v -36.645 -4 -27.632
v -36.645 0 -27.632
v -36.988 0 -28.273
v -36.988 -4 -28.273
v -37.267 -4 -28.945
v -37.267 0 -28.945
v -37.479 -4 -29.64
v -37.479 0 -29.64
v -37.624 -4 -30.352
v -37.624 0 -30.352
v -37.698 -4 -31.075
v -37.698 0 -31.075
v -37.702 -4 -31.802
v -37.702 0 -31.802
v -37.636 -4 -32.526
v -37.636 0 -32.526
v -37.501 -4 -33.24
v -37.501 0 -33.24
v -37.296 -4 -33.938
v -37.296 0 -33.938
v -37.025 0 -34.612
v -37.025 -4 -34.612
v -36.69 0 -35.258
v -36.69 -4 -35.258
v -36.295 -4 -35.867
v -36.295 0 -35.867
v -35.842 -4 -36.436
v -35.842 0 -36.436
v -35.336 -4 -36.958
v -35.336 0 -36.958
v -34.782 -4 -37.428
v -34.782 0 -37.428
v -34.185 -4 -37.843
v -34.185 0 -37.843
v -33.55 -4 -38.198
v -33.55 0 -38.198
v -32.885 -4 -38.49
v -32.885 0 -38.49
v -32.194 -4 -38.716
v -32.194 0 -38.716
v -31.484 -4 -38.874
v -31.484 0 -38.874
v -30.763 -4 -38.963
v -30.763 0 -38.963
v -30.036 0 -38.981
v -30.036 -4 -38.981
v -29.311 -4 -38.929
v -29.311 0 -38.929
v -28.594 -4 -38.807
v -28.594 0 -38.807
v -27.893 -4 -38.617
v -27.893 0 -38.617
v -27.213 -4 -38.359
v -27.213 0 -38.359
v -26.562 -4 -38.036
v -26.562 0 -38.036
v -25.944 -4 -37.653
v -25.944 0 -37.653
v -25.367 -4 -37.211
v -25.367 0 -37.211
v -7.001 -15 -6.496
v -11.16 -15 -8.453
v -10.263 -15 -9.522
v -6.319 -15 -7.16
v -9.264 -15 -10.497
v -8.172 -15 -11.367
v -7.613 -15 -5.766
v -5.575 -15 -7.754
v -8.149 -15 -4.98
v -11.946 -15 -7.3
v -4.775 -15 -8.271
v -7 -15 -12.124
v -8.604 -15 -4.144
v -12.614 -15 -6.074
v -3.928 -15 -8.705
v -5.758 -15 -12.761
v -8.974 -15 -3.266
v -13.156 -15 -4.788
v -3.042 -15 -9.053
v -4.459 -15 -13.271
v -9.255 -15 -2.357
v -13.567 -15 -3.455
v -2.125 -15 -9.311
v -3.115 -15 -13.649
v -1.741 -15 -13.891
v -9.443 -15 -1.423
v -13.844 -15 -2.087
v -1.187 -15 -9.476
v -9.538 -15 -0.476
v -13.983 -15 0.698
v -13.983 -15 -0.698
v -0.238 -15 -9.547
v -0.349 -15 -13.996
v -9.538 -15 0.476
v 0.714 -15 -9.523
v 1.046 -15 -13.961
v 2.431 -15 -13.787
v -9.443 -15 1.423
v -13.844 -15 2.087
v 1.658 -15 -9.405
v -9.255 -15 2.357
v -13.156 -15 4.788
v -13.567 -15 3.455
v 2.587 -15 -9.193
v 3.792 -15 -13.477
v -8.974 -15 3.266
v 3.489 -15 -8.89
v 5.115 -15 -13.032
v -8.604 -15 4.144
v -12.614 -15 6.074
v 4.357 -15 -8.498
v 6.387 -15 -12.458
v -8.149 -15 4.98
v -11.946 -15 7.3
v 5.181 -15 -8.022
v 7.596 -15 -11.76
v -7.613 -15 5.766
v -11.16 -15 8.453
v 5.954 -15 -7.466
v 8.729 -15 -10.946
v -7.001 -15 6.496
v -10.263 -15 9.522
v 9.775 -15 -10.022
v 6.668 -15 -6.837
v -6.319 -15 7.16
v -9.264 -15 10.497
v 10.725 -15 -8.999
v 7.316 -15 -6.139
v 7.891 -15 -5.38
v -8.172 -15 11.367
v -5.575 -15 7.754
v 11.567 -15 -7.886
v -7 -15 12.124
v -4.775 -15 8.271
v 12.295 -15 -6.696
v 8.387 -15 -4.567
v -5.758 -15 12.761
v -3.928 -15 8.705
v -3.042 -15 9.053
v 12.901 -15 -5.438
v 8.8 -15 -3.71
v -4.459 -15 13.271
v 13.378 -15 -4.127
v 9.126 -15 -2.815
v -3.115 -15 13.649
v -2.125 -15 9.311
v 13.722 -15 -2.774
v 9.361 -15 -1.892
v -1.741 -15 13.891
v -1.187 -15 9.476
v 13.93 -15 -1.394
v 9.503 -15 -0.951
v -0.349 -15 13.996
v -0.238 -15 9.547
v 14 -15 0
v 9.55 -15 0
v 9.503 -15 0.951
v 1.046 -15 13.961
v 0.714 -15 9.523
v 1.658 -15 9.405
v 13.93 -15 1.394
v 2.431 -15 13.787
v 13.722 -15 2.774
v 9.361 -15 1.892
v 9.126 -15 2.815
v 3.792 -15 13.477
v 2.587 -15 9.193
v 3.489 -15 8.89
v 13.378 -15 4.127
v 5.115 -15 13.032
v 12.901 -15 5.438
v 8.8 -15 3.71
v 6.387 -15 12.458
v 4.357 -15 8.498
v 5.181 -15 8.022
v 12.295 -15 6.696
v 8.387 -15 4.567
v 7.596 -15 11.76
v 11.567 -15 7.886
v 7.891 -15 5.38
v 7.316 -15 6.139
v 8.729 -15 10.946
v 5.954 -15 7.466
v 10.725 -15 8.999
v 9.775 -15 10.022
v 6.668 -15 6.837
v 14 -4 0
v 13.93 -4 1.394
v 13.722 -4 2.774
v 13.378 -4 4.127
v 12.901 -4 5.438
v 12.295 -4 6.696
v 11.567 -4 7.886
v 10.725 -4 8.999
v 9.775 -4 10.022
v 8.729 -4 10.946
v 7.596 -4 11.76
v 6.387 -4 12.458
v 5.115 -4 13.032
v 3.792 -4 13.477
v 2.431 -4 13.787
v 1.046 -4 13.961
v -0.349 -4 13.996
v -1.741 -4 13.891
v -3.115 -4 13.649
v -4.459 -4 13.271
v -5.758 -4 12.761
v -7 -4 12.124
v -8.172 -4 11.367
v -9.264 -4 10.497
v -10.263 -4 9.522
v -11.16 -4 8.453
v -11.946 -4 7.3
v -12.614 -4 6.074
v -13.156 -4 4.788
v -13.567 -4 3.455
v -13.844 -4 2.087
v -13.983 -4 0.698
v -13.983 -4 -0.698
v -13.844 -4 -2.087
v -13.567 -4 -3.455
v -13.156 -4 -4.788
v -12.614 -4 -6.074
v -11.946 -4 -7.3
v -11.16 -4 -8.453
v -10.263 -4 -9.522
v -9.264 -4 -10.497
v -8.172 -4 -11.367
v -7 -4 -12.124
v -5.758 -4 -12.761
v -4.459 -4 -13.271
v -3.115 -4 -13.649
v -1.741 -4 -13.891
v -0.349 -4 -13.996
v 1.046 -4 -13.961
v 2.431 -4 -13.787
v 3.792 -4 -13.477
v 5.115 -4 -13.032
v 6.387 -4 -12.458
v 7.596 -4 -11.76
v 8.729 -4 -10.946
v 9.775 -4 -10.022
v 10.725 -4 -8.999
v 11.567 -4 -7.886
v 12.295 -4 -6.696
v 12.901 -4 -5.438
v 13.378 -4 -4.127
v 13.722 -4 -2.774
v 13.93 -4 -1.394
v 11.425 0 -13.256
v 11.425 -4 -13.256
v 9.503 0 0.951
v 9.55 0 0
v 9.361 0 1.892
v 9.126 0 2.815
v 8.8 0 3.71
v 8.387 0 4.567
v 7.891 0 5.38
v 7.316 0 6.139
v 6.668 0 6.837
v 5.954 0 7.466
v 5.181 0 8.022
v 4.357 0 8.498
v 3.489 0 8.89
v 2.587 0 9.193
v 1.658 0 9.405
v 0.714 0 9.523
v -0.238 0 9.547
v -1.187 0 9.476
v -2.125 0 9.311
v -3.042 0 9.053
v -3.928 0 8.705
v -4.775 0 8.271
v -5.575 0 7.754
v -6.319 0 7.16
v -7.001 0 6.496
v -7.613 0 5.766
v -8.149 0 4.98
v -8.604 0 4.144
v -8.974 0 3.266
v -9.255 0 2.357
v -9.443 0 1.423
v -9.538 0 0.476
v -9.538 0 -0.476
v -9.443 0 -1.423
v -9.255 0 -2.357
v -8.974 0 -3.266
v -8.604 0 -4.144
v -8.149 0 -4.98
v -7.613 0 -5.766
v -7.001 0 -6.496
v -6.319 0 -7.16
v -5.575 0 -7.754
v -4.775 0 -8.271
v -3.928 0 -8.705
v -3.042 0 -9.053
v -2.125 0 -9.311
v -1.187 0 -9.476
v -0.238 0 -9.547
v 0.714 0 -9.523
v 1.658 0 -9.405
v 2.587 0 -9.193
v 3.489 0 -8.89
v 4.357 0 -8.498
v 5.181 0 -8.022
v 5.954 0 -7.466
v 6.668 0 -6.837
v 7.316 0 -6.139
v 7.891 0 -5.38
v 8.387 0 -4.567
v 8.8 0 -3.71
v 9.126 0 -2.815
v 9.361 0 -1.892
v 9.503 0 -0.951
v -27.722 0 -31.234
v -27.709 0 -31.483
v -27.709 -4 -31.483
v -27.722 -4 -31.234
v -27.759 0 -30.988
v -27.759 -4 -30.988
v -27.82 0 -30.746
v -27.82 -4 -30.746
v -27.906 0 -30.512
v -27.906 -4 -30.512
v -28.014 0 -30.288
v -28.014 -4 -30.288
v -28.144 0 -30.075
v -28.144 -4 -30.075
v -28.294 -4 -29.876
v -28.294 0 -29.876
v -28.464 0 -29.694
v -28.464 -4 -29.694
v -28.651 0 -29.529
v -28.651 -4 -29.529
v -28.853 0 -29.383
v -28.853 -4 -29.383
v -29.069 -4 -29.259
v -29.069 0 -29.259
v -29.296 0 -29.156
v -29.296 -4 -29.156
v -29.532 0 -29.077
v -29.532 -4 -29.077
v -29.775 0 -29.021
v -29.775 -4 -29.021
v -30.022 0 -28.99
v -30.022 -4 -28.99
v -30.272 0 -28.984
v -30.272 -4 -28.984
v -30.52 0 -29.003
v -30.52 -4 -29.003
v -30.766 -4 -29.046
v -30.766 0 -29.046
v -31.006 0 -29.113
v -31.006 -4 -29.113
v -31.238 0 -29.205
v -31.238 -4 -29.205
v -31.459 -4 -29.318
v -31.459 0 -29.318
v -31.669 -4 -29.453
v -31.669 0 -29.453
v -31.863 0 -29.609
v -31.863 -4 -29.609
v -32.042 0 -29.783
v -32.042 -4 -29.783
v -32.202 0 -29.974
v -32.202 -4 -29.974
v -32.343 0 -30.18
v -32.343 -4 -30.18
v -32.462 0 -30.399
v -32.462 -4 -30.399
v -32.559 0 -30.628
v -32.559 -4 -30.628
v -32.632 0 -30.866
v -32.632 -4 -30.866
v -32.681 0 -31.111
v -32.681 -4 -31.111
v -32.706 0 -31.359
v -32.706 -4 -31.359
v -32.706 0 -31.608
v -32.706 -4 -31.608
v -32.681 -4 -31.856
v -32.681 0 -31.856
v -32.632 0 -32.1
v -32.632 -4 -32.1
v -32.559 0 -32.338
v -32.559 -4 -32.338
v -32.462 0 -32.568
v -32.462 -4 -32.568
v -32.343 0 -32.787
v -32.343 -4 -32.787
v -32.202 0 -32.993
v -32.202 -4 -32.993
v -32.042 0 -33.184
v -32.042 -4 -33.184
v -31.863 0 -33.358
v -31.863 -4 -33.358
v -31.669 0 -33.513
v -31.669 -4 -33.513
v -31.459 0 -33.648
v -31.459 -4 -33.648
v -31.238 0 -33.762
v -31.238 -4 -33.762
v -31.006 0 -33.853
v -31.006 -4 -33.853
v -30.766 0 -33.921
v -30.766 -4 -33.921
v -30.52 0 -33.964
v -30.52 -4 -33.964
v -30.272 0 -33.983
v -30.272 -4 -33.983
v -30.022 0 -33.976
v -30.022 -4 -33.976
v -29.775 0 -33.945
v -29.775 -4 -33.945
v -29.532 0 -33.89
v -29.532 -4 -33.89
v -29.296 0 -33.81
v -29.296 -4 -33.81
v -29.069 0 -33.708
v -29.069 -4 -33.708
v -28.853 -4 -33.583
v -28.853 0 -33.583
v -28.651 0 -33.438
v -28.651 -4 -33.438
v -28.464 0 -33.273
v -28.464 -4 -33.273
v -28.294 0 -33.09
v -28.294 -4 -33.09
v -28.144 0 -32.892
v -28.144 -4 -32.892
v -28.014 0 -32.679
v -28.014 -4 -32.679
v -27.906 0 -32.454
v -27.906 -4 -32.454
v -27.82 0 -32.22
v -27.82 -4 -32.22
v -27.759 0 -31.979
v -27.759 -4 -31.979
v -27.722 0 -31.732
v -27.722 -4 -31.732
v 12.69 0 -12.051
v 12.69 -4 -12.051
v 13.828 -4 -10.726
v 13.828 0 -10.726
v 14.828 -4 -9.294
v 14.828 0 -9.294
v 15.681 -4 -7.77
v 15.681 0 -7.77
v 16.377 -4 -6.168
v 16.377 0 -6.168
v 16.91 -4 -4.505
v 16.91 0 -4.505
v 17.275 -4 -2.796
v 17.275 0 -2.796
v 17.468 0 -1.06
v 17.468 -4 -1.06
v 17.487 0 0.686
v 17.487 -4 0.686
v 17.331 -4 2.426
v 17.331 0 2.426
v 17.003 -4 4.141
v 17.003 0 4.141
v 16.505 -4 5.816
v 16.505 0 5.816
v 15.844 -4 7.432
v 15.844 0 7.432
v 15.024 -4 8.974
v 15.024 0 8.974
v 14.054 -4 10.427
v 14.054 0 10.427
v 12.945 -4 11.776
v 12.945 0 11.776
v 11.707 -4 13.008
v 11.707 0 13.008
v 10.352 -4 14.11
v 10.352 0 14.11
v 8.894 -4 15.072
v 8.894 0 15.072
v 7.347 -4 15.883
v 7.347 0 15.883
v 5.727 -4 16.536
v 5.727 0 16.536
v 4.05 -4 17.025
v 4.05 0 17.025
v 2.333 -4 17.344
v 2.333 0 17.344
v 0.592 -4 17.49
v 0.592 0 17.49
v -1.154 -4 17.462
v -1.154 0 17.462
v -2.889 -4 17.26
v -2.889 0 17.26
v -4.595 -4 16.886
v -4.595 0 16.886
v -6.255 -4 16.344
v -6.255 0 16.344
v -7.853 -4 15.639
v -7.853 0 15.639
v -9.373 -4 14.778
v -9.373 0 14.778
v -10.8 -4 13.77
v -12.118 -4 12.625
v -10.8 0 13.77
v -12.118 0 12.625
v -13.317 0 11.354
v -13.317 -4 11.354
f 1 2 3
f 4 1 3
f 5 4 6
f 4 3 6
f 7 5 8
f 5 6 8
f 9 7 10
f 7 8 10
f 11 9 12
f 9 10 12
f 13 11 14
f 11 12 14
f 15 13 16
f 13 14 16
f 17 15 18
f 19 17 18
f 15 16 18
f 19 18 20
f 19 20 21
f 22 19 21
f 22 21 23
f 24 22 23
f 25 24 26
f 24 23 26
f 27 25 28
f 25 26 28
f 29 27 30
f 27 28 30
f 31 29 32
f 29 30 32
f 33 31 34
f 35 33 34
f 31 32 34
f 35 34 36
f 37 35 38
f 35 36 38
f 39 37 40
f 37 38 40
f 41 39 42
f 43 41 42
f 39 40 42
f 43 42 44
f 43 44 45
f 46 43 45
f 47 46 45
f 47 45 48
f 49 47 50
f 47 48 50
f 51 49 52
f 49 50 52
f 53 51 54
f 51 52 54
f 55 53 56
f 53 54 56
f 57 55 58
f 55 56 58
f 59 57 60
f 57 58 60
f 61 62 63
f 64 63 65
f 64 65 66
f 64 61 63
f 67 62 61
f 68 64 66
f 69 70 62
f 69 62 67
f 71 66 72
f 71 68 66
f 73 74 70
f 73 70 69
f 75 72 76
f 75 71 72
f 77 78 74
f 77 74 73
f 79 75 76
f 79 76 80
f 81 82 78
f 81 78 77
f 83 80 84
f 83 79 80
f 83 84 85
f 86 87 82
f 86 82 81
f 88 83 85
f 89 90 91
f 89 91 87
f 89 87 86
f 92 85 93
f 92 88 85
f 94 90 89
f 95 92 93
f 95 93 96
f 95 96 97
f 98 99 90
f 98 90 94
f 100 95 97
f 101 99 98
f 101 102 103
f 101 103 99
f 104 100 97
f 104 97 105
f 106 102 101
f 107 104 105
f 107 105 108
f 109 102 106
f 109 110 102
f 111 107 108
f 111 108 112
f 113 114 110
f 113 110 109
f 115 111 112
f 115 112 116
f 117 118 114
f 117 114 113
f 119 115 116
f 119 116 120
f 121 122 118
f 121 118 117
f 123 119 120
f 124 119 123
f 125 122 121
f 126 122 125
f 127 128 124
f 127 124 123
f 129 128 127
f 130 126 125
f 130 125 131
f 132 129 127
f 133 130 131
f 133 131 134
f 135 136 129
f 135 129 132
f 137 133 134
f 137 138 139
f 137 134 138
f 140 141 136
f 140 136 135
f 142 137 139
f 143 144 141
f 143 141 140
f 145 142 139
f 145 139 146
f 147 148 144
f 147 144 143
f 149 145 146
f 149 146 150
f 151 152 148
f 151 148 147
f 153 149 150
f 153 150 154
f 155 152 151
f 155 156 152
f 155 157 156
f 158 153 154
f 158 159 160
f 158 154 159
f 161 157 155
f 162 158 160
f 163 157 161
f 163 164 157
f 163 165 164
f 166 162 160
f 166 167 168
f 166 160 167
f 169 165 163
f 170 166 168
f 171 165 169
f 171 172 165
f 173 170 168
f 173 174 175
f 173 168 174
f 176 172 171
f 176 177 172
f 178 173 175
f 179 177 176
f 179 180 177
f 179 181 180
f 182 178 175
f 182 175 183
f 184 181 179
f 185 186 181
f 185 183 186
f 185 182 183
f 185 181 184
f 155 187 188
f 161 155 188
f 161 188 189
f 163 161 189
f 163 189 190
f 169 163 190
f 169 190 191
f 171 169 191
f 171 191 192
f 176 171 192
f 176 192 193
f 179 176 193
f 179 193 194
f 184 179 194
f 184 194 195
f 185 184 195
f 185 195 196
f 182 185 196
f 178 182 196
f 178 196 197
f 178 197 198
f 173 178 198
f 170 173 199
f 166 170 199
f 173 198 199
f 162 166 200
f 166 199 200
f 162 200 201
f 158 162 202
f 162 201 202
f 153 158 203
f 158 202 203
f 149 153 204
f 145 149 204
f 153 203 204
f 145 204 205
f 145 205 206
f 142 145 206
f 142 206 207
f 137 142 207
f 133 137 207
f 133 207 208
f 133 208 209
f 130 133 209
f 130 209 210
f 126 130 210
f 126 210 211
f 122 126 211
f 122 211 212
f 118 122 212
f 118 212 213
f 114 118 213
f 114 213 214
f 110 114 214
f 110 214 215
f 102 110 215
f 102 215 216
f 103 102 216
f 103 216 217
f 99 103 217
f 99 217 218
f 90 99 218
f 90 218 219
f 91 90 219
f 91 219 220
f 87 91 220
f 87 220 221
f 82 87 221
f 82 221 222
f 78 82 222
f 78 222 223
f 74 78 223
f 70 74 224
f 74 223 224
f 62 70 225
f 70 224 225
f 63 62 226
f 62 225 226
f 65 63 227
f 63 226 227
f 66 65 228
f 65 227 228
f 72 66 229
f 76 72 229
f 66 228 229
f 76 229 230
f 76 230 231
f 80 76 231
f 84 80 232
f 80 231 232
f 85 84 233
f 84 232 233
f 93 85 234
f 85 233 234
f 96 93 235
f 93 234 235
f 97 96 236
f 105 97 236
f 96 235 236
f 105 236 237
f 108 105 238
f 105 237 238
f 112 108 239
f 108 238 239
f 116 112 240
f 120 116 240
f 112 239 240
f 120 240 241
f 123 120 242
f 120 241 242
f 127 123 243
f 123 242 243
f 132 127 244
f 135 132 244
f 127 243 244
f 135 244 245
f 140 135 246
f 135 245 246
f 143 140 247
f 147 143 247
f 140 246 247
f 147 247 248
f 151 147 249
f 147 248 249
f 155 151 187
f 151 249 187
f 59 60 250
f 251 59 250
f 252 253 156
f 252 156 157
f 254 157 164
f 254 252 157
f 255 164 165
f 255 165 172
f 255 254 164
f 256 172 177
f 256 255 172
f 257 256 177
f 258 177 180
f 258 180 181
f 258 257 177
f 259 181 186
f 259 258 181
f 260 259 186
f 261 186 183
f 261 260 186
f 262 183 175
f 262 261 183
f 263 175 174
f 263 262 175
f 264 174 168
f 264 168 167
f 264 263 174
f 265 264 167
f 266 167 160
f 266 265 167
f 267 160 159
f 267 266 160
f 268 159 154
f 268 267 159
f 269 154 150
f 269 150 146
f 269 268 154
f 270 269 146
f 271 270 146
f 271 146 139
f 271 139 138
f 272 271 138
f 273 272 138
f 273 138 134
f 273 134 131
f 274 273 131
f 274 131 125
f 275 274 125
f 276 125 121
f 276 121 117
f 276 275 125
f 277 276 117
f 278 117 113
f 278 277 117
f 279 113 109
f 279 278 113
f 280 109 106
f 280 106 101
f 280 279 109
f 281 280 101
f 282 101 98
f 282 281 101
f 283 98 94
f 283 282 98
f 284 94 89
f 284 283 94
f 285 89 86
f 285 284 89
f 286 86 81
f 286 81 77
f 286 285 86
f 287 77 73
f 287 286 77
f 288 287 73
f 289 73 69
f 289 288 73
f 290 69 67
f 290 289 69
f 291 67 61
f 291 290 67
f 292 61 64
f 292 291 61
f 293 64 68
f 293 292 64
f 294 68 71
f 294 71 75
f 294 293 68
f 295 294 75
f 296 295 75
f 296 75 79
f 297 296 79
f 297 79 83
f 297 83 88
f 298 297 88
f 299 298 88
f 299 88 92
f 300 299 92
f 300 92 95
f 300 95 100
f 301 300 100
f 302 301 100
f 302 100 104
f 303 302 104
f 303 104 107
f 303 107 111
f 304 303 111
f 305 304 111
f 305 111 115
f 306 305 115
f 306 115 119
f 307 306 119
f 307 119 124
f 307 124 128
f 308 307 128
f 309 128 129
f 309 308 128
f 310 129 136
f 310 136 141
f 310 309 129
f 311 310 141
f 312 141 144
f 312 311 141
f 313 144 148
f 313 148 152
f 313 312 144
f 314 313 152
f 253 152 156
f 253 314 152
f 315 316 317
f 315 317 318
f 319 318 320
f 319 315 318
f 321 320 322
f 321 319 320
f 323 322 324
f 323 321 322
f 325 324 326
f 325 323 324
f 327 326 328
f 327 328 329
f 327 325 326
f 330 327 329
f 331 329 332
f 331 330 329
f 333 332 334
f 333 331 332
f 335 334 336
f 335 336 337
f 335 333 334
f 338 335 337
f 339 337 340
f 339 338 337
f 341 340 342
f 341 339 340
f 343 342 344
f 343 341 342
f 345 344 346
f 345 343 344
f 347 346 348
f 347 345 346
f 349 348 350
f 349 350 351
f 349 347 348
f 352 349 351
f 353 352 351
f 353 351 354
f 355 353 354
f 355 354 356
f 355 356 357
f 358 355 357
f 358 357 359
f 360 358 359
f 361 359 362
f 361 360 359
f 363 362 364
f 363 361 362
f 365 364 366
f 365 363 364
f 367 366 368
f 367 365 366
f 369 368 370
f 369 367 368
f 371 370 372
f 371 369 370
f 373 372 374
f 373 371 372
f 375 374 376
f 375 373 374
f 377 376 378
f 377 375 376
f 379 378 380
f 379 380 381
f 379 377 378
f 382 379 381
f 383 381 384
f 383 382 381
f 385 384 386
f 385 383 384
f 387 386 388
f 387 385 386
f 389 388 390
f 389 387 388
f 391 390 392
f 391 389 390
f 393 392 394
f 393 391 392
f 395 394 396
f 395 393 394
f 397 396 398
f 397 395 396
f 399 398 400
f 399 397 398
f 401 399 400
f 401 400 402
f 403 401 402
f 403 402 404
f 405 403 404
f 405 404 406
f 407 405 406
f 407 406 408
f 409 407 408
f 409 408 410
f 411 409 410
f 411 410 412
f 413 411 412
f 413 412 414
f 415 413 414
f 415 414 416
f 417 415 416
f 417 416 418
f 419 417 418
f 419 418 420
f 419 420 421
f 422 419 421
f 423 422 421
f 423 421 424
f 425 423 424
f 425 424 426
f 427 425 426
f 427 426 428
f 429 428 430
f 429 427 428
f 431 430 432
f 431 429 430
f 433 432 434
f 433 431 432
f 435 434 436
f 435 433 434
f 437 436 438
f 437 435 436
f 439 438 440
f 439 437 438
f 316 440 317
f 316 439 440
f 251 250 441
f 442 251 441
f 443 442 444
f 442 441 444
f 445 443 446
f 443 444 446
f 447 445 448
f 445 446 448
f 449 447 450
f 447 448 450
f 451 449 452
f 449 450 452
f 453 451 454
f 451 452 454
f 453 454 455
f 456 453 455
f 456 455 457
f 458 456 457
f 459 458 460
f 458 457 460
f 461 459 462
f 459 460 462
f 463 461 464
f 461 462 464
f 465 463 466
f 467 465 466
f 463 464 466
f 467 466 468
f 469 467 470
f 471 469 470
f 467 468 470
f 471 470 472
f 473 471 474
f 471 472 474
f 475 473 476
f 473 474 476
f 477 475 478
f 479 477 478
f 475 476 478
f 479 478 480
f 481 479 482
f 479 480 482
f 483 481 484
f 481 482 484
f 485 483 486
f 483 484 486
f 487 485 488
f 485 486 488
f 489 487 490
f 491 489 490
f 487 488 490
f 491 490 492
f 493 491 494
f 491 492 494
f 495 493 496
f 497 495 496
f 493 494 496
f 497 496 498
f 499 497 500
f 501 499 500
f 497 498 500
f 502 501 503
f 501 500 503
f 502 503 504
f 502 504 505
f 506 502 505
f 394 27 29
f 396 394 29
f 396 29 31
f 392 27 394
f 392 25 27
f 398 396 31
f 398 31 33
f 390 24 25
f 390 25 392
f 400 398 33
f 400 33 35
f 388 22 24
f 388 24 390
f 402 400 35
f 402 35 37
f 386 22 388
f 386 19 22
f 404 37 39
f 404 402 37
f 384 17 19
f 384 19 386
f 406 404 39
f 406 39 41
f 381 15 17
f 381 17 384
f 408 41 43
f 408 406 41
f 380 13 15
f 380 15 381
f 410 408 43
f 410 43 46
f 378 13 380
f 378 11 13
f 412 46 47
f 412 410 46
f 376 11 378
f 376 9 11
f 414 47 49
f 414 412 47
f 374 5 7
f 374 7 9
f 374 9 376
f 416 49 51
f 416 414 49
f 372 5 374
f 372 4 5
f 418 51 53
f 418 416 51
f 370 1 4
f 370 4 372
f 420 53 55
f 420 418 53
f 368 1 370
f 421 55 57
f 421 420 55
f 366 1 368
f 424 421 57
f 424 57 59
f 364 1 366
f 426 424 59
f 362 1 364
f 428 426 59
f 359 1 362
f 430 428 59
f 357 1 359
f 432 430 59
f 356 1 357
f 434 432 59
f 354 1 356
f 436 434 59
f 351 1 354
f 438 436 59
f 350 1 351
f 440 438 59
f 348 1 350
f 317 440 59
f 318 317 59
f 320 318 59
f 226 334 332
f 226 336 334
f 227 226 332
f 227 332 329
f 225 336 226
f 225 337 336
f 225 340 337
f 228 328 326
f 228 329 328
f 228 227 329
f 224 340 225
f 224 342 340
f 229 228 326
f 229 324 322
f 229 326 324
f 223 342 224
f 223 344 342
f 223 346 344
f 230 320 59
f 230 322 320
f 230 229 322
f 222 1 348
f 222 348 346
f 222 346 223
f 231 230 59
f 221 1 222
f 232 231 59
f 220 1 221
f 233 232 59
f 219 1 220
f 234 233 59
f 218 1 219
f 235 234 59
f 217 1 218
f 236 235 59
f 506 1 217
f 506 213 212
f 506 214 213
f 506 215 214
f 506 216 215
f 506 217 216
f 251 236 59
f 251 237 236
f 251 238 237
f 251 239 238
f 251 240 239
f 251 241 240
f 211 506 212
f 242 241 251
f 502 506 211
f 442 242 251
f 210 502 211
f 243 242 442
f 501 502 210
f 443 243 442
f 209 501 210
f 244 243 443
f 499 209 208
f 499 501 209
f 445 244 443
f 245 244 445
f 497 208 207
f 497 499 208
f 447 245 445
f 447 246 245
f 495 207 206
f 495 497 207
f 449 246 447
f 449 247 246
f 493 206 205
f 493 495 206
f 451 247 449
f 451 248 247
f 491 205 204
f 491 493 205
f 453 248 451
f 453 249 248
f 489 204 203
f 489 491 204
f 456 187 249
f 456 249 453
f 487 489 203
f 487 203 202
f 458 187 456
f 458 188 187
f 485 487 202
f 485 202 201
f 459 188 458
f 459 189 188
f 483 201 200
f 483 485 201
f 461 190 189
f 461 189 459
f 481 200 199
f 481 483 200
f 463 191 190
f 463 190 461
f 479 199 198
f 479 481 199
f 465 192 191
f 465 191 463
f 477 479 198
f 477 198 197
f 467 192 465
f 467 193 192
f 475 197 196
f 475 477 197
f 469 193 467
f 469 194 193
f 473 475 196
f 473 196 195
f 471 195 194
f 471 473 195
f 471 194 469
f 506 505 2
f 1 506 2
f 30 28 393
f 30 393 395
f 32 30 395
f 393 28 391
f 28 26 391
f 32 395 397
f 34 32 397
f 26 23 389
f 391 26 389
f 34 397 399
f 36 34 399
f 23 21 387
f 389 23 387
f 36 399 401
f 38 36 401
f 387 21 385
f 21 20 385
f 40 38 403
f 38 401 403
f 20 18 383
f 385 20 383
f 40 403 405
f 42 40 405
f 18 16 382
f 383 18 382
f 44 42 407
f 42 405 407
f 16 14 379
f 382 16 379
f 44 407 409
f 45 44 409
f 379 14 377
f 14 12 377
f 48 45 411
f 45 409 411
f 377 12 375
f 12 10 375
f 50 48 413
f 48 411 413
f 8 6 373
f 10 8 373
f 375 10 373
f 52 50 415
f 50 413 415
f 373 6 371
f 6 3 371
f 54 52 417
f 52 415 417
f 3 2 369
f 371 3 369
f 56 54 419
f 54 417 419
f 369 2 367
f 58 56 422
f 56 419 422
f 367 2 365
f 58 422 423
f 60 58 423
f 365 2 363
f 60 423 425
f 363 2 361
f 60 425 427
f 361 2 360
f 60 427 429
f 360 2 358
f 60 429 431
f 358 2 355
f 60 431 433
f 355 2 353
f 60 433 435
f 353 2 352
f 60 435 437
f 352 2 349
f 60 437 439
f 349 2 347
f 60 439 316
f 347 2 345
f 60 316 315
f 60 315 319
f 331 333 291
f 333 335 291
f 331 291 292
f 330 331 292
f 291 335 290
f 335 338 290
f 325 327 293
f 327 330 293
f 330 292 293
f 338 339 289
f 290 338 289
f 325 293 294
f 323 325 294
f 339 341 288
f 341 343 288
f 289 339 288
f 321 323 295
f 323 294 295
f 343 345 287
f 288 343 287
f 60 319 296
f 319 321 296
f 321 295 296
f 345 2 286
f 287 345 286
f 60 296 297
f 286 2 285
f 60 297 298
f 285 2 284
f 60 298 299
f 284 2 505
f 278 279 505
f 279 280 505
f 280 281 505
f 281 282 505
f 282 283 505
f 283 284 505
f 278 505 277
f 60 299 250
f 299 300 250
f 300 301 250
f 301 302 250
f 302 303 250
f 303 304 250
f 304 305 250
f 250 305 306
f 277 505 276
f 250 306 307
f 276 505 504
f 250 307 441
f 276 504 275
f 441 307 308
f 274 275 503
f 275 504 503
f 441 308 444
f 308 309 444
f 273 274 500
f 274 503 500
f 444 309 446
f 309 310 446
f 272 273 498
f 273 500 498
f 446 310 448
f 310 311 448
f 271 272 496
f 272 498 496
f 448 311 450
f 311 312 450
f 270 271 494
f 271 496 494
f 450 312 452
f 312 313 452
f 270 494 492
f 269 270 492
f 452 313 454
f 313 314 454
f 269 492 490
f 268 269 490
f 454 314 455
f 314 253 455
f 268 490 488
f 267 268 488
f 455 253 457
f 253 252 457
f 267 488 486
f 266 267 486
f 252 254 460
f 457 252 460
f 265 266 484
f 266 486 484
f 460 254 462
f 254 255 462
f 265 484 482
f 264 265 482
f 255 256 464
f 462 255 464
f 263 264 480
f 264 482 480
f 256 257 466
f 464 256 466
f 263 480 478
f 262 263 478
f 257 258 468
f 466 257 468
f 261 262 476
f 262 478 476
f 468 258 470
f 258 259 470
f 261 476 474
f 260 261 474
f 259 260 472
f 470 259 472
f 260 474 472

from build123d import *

# Parameters (mm, degrees)
F0_R     = 14
F0_R_2   = 9.55
F1_DEPTH = 15
F0_R_3   = 2.5
F2_DEPTH = 4


with BuildPart() as f1:
    # F0 (on Front) → F1 (new body)
    with BuildSketch(Plane.XZ):
        Circle(F0_R)
        Circle(F0_R_2, mode=Mode.SUBTRACT)
    extrude(amount=F1_DEPTH)

    # F0 (on Front) → F2 (join)
    with BuildSketch(Plane.XZ):
        with BuildLine():
            ThreePointArc((11.425317, -13.255645), (12.341197, 12.407451), (-13.316628, 11.354181))
            Line((-13.316628, 11.354181), (-36.645094, -27.632273))
            ThreePointArc((-36.645094, -27.632273), (-35.06435, -37.199789), (-25.367135, -37.210734))
            Line((-25.367135, -37.210734), (11.425317, -13.255645))
        make_face()
        with Locations((-30.209284, -31.483292)):
            Circle(F0_R_3, mode=Mode.SUBTRACT)
        Circle(F0_R, mode=Mode.SUBTRACT)
    extrude(amount=F2_DEPTH)


solid = f1.part
